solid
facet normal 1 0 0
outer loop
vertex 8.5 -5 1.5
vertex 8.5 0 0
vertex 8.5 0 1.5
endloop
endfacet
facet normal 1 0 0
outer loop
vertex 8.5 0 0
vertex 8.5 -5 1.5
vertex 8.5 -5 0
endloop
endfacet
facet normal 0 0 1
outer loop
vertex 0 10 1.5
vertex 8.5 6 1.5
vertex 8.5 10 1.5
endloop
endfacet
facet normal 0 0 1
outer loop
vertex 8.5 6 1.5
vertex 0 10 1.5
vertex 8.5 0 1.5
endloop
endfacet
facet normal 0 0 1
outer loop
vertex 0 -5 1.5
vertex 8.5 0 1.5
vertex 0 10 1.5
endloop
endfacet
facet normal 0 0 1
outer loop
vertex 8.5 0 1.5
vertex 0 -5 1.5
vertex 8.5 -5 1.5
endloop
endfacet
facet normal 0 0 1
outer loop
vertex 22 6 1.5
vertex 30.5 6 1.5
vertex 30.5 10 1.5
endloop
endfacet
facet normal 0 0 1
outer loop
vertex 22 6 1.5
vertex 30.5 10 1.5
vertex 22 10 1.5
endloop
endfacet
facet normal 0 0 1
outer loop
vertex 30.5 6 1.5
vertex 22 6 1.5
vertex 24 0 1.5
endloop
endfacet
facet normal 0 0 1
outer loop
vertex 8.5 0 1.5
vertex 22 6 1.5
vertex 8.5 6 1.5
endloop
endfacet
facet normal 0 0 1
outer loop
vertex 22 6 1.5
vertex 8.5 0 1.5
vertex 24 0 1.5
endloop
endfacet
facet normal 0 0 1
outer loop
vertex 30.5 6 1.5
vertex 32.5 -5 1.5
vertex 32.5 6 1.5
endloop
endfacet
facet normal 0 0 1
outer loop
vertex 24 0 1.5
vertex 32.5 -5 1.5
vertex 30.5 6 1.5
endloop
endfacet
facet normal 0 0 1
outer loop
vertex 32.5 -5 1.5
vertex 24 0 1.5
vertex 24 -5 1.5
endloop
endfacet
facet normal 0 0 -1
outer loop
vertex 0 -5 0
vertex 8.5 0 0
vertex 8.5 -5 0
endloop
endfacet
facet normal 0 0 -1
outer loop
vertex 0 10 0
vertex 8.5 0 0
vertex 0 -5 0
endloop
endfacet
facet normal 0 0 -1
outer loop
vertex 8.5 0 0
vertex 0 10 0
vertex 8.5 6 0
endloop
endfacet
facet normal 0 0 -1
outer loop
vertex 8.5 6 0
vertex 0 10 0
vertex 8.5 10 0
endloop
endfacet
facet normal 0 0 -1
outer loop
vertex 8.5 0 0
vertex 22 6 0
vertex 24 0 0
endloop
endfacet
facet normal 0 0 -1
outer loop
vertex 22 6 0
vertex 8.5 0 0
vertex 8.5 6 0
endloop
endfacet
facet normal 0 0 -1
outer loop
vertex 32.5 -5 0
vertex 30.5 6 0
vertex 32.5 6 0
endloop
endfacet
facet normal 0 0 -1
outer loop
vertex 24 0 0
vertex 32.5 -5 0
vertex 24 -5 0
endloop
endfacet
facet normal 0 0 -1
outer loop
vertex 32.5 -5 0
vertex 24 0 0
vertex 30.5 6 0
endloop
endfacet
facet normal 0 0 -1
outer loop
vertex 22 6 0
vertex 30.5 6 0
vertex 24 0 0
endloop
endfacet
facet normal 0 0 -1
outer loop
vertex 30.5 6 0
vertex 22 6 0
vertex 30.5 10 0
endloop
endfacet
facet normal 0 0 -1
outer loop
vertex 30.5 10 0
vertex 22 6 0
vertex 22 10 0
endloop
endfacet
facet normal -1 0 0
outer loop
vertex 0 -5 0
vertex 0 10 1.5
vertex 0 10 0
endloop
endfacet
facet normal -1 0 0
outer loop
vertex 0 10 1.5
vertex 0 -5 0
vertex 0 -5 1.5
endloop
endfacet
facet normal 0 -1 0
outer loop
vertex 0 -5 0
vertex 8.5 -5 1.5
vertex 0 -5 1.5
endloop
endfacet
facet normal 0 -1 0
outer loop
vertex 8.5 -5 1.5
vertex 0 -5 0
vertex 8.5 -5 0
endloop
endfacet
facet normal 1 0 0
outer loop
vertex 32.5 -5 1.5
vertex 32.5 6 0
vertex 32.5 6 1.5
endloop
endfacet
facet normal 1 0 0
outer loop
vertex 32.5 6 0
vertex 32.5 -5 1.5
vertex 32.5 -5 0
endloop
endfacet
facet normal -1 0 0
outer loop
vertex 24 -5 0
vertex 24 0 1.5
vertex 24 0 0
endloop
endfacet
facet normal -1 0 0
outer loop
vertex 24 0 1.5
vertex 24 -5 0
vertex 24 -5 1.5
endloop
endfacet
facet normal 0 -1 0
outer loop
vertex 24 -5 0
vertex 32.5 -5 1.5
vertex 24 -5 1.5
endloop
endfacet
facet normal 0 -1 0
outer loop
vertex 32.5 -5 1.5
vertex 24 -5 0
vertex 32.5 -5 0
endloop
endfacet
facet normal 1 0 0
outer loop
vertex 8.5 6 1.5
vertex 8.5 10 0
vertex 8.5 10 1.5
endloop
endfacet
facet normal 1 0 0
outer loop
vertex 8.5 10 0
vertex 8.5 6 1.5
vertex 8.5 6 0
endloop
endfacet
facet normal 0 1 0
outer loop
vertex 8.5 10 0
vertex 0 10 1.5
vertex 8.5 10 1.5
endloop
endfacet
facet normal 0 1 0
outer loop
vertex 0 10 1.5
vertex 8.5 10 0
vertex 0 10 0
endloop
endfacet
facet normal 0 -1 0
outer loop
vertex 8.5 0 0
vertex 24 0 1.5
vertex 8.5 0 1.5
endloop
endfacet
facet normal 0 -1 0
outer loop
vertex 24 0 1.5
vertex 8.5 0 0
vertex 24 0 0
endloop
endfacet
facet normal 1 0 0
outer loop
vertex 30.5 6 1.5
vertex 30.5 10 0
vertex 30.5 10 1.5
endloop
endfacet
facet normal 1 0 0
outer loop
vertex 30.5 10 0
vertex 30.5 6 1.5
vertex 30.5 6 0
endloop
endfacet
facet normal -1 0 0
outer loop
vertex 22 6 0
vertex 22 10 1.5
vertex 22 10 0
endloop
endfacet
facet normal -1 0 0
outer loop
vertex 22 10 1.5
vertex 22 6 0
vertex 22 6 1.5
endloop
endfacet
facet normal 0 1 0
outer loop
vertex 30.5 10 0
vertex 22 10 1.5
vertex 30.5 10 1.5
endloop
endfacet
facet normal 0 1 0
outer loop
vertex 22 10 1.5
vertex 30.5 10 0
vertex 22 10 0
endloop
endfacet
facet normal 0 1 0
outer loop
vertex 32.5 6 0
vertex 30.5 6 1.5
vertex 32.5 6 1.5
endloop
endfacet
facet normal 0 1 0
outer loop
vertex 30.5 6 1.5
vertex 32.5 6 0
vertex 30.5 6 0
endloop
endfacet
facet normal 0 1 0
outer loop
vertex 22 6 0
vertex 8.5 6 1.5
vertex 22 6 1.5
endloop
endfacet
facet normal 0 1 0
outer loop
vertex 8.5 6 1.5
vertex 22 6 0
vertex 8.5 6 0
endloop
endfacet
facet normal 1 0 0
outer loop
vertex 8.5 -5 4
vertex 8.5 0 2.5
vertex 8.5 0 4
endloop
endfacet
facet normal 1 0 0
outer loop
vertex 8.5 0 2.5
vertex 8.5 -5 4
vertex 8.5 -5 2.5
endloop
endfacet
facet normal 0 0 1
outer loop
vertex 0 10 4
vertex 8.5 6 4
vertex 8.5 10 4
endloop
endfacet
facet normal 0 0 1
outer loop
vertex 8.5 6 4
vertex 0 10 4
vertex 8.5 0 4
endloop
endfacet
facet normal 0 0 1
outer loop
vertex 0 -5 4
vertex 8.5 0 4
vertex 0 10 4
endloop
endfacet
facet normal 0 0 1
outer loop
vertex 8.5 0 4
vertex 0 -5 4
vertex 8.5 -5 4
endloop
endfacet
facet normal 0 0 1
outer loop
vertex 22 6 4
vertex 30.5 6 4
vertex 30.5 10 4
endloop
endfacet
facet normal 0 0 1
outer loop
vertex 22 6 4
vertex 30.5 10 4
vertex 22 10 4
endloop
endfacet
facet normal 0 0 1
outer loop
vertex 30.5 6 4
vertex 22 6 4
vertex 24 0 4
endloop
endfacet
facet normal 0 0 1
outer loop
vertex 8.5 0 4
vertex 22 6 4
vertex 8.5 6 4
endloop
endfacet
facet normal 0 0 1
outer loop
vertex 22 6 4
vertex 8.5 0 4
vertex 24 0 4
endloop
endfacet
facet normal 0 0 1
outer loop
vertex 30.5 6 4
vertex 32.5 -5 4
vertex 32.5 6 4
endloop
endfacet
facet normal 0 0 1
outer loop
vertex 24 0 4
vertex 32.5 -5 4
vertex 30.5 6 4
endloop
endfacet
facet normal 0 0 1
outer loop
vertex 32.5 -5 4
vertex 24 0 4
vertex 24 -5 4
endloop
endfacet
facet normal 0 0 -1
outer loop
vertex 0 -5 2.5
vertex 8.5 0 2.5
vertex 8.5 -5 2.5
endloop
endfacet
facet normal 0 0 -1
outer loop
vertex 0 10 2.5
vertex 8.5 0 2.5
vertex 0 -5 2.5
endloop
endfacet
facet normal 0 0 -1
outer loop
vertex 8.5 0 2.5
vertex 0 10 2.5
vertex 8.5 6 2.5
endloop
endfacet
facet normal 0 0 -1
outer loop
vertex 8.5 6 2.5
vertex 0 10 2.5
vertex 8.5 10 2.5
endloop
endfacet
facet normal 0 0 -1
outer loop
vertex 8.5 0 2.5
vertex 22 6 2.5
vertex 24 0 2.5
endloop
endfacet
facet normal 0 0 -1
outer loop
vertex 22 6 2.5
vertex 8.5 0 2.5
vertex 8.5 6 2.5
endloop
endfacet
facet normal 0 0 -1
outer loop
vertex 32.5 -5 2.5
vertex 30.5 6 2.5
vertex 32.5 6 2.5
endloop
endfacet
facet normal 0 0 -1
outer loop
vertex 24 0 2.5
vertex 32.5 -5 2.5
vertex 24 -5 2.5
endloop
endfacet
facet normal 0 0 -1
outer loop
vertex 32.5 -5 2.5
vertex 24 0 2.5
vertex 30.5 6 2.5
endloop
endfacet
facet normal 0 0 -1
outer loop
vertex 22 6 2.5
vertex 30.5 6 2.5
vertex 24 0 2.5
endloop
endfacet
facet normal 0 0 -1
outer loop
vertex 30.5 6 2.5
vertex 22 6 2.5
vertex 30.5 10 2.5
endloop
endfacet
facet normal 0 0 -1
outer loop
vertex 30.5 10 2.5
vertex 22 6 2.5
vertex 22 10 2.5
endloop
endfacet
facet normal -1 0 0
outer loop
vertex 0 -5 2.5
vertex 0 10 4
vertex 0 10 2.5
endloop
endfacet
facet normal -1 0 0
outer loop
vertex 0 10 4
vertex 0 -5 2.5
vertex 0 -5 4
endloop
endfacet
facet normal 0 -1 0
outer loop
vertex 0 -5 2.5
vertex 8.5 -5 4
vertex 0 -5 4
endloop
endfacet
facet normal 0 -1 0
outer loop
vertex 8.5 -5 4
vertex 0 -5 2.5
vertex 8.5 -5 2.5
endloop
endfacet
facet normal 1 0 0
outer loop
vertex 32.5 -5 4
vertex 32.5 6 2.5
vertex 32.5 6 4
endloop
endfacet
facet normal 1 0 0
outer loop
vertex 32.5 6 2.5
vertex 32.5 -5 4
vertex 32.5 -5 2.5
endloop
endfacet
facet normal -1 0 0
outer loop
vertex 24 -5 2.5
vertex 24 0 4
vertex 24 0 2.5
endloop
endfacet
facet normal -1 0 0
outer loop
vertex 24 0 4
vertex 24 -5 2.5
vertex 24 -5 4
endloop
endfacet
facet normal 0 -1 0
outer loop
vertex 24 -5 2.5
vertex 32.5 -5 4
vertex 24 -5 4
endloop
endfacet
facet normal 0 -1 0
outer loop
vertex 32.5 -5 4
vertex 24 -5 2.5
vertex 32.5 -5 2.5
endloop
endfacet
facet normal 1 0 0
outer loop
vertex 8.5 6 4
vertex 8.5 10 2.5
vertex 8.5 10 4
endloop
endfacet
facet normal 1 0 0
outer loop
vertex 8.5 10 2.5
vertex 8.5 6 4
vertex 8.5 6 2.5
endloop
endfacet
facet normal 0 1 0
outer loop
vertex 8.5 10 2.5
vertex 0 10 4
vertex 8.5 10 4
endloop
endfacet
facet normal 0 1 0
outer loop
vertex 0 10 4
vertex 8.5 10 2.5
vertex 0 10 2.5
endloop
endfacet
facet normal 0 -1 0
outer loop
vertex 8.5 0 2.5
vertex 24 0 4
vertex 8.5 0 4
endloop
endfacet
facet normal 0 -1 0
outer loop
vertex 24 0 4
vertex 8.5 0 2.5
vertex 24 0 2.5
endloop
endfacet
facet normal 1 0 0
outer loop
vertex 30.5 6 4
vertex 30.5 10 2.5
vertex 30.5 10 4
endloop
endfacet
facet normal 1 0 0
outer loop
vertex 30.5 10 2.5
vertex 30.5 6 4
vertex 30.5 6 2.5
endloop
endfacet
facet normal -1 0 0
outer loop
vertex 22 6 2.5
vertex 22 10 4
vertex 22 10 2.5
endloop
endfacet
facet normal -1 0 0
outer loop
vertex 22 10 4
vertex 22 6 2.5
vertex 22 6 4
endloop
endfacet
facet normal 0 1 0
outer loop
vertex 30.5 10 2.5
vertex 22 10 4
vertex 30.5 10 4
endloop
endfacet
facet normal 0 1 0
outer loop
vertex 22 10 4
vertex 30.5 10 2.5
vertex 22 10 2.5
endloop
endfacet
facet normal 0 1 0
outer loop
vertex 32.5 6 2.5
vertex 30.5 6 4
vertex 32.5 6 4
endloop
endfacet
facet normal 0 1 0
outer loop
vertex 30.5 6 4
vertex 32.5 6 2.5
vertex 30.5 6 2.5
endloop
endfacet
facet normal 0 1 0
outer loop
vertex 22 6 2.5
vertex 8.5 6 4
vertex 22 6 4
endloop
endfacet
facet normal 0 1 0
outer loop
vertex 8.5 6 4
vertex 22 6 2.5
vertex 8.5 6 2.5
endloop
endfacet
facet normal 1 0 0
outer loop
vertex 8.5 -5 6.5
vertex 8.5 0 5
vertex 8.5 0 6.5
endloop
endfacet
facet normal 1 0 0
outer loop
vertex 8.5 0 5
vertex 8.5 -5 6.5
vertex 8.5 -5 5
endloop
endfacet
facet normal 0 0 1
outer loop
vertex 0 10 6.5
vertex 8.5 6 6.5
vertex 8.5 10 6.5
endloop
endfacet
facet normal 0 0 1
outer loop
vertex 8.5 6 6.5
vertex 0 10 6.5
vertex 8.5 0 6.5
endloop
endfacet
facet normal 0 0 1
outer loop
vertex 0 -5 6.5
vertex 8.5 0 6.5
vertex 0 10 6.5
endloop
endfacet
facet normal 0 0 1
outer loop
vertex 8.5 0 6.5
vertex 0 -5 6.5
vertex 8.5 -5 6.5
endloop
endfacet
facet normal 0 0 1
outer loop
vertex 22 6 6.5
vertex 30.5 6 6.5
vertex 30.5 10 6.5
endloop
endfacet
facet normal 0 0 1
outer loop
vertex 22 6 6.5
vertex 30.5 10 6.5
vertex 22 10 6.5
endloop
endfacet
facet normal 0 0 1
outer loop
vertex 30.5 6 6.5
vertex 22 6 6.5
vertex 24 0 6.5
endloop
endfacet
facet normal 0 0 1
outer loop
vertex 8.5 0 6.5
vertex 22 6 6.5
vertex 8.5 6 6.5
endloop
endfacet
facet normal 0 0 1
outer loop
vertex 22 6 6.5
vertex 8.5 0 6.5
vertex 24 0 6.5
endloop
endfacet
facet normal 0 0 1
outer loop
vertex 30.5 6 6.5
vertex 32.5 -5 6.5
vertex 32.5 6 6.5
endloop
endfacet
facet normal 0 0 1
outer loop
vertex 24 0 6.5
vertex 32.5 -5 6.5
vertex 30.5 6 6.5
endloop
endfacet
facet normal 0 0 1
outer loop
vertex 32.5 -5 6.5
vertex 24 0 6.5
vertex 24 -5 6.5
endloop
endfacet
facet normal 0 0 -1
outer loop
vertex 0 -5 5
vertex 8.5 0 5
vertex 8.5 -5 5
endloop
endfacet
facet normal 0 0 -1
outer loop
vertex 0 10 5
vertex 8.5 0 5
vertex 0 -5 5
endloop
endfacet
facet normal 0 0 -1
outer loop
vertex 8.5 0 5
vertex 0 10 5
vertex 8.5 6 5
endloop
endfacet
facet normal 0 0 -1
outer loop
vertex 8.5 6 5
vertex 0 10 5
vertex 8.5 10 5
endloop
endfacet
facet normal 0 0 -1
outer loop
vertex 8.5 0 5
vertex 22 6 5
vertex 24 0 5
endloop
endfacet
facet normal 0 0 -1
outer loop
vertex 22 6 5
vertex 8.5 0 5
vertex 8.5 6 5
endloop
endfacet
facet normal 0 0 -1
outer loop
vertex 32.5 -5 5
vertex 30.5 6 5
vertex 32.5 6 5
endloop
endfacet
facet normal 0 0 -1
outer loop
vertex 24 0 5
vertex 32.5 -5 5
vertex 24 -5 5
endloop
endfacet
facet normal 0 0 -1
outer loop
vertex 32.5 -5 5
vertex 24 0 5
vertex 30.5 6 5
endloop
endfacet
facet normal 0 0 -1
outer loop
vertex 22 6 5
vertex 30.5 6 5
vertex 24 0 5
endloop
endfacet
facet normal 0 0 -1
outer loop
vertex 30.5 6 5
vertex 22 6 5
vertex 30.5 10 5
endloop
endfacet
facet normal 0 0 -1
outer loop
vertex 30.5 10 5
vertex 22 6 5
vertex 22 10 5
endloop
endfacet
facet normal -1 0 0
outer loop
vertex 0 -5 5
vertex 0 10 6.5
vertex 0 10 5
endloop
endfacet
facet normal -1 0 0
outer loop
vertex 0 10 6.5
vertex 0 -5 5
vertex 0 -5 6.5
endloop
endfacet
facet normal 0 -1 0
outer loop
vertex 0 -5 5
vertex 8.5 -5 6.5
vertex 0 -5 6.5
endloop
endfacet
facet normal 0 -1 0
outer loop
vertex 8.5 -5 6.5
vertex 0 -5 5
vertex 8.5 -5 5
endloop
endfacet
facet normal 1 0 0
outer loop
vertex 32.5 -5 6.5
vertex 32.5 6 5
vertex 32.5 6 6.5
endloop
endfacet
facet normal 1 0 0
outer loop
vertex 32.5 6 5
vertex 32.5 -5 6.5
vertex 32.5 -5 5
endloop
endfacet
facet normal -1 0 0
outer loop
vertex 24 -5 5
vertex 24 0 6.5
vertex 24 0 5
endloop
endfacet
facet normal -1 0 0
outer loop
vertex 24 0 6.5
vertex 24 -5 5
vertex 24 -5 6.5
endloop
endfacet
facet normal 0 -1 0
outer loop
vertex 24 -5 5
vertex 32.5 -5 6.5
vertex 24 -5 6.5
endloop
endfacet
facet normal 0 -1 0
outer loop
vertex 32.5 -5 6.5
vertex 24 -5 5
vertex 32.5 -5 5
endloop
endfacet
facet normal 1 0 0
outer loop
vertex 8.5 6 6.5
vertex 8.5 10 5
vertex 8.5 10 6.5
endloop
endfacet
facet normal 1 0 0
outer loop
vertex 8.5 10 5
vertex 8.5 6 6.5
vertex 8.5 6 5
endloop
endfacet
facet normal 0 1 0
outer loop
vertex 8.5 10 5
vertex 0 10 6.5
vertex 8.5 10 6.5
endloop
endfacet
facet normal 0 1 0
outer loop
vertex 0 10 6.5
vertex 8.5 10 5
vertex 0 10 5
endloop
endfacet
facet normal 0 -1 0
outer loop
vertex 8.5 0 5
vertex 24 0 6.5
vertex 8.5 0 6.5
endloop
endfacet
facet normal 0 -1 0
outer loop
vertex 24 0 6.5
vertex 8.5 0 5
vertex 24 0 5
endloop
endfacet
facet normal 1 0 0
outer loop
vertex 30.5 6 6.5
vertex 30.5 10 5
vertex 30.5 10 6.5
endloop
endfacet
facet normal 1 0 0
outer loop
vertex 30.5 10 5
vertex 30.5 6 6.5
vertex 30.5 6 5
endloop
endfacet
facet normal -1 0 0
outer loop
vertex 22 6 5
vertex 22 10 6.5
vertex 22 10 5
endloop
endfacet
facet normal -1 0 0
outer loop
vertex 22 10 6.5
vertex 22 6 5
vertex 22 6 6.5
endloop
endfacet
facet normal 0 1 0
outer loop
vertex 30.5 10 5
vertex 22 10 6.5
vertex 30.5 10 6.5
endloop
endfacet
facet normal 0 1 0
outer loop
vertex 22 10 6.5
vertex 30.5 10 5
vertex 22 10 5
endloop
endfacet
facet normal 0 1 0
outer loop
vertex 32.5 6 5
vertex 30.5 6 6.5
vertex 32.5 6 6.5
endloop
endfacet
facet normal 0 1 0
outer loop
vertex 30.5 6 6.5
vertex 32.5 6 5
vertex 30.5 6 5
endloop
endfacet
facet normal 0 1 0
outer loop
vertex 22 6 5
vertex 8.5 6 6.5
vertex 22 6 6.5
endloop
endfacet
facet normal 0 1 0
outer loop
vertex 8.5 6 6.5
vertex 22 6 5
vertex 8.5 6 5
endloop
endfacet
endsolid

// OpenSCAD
module TrackSpacer(s1,s2) {
	cube([8.5,10,1.5]);
	translate([s1,0,0])
		cube([8.5,10,1.5]);

	translate([0,-5,0]) {
		cube([8.5,10,1.5]);
		translate([s2,0,0])
			cube([8.5,10,1.5]);
	}
	cube([s2+8.5,6,1.5]);
}

TrackSpacer(22,24);
translate([0,0,2.5])
	TrackSpacer(22,24);
translate([0,0,5])
	TrackSpacer(22,24);
